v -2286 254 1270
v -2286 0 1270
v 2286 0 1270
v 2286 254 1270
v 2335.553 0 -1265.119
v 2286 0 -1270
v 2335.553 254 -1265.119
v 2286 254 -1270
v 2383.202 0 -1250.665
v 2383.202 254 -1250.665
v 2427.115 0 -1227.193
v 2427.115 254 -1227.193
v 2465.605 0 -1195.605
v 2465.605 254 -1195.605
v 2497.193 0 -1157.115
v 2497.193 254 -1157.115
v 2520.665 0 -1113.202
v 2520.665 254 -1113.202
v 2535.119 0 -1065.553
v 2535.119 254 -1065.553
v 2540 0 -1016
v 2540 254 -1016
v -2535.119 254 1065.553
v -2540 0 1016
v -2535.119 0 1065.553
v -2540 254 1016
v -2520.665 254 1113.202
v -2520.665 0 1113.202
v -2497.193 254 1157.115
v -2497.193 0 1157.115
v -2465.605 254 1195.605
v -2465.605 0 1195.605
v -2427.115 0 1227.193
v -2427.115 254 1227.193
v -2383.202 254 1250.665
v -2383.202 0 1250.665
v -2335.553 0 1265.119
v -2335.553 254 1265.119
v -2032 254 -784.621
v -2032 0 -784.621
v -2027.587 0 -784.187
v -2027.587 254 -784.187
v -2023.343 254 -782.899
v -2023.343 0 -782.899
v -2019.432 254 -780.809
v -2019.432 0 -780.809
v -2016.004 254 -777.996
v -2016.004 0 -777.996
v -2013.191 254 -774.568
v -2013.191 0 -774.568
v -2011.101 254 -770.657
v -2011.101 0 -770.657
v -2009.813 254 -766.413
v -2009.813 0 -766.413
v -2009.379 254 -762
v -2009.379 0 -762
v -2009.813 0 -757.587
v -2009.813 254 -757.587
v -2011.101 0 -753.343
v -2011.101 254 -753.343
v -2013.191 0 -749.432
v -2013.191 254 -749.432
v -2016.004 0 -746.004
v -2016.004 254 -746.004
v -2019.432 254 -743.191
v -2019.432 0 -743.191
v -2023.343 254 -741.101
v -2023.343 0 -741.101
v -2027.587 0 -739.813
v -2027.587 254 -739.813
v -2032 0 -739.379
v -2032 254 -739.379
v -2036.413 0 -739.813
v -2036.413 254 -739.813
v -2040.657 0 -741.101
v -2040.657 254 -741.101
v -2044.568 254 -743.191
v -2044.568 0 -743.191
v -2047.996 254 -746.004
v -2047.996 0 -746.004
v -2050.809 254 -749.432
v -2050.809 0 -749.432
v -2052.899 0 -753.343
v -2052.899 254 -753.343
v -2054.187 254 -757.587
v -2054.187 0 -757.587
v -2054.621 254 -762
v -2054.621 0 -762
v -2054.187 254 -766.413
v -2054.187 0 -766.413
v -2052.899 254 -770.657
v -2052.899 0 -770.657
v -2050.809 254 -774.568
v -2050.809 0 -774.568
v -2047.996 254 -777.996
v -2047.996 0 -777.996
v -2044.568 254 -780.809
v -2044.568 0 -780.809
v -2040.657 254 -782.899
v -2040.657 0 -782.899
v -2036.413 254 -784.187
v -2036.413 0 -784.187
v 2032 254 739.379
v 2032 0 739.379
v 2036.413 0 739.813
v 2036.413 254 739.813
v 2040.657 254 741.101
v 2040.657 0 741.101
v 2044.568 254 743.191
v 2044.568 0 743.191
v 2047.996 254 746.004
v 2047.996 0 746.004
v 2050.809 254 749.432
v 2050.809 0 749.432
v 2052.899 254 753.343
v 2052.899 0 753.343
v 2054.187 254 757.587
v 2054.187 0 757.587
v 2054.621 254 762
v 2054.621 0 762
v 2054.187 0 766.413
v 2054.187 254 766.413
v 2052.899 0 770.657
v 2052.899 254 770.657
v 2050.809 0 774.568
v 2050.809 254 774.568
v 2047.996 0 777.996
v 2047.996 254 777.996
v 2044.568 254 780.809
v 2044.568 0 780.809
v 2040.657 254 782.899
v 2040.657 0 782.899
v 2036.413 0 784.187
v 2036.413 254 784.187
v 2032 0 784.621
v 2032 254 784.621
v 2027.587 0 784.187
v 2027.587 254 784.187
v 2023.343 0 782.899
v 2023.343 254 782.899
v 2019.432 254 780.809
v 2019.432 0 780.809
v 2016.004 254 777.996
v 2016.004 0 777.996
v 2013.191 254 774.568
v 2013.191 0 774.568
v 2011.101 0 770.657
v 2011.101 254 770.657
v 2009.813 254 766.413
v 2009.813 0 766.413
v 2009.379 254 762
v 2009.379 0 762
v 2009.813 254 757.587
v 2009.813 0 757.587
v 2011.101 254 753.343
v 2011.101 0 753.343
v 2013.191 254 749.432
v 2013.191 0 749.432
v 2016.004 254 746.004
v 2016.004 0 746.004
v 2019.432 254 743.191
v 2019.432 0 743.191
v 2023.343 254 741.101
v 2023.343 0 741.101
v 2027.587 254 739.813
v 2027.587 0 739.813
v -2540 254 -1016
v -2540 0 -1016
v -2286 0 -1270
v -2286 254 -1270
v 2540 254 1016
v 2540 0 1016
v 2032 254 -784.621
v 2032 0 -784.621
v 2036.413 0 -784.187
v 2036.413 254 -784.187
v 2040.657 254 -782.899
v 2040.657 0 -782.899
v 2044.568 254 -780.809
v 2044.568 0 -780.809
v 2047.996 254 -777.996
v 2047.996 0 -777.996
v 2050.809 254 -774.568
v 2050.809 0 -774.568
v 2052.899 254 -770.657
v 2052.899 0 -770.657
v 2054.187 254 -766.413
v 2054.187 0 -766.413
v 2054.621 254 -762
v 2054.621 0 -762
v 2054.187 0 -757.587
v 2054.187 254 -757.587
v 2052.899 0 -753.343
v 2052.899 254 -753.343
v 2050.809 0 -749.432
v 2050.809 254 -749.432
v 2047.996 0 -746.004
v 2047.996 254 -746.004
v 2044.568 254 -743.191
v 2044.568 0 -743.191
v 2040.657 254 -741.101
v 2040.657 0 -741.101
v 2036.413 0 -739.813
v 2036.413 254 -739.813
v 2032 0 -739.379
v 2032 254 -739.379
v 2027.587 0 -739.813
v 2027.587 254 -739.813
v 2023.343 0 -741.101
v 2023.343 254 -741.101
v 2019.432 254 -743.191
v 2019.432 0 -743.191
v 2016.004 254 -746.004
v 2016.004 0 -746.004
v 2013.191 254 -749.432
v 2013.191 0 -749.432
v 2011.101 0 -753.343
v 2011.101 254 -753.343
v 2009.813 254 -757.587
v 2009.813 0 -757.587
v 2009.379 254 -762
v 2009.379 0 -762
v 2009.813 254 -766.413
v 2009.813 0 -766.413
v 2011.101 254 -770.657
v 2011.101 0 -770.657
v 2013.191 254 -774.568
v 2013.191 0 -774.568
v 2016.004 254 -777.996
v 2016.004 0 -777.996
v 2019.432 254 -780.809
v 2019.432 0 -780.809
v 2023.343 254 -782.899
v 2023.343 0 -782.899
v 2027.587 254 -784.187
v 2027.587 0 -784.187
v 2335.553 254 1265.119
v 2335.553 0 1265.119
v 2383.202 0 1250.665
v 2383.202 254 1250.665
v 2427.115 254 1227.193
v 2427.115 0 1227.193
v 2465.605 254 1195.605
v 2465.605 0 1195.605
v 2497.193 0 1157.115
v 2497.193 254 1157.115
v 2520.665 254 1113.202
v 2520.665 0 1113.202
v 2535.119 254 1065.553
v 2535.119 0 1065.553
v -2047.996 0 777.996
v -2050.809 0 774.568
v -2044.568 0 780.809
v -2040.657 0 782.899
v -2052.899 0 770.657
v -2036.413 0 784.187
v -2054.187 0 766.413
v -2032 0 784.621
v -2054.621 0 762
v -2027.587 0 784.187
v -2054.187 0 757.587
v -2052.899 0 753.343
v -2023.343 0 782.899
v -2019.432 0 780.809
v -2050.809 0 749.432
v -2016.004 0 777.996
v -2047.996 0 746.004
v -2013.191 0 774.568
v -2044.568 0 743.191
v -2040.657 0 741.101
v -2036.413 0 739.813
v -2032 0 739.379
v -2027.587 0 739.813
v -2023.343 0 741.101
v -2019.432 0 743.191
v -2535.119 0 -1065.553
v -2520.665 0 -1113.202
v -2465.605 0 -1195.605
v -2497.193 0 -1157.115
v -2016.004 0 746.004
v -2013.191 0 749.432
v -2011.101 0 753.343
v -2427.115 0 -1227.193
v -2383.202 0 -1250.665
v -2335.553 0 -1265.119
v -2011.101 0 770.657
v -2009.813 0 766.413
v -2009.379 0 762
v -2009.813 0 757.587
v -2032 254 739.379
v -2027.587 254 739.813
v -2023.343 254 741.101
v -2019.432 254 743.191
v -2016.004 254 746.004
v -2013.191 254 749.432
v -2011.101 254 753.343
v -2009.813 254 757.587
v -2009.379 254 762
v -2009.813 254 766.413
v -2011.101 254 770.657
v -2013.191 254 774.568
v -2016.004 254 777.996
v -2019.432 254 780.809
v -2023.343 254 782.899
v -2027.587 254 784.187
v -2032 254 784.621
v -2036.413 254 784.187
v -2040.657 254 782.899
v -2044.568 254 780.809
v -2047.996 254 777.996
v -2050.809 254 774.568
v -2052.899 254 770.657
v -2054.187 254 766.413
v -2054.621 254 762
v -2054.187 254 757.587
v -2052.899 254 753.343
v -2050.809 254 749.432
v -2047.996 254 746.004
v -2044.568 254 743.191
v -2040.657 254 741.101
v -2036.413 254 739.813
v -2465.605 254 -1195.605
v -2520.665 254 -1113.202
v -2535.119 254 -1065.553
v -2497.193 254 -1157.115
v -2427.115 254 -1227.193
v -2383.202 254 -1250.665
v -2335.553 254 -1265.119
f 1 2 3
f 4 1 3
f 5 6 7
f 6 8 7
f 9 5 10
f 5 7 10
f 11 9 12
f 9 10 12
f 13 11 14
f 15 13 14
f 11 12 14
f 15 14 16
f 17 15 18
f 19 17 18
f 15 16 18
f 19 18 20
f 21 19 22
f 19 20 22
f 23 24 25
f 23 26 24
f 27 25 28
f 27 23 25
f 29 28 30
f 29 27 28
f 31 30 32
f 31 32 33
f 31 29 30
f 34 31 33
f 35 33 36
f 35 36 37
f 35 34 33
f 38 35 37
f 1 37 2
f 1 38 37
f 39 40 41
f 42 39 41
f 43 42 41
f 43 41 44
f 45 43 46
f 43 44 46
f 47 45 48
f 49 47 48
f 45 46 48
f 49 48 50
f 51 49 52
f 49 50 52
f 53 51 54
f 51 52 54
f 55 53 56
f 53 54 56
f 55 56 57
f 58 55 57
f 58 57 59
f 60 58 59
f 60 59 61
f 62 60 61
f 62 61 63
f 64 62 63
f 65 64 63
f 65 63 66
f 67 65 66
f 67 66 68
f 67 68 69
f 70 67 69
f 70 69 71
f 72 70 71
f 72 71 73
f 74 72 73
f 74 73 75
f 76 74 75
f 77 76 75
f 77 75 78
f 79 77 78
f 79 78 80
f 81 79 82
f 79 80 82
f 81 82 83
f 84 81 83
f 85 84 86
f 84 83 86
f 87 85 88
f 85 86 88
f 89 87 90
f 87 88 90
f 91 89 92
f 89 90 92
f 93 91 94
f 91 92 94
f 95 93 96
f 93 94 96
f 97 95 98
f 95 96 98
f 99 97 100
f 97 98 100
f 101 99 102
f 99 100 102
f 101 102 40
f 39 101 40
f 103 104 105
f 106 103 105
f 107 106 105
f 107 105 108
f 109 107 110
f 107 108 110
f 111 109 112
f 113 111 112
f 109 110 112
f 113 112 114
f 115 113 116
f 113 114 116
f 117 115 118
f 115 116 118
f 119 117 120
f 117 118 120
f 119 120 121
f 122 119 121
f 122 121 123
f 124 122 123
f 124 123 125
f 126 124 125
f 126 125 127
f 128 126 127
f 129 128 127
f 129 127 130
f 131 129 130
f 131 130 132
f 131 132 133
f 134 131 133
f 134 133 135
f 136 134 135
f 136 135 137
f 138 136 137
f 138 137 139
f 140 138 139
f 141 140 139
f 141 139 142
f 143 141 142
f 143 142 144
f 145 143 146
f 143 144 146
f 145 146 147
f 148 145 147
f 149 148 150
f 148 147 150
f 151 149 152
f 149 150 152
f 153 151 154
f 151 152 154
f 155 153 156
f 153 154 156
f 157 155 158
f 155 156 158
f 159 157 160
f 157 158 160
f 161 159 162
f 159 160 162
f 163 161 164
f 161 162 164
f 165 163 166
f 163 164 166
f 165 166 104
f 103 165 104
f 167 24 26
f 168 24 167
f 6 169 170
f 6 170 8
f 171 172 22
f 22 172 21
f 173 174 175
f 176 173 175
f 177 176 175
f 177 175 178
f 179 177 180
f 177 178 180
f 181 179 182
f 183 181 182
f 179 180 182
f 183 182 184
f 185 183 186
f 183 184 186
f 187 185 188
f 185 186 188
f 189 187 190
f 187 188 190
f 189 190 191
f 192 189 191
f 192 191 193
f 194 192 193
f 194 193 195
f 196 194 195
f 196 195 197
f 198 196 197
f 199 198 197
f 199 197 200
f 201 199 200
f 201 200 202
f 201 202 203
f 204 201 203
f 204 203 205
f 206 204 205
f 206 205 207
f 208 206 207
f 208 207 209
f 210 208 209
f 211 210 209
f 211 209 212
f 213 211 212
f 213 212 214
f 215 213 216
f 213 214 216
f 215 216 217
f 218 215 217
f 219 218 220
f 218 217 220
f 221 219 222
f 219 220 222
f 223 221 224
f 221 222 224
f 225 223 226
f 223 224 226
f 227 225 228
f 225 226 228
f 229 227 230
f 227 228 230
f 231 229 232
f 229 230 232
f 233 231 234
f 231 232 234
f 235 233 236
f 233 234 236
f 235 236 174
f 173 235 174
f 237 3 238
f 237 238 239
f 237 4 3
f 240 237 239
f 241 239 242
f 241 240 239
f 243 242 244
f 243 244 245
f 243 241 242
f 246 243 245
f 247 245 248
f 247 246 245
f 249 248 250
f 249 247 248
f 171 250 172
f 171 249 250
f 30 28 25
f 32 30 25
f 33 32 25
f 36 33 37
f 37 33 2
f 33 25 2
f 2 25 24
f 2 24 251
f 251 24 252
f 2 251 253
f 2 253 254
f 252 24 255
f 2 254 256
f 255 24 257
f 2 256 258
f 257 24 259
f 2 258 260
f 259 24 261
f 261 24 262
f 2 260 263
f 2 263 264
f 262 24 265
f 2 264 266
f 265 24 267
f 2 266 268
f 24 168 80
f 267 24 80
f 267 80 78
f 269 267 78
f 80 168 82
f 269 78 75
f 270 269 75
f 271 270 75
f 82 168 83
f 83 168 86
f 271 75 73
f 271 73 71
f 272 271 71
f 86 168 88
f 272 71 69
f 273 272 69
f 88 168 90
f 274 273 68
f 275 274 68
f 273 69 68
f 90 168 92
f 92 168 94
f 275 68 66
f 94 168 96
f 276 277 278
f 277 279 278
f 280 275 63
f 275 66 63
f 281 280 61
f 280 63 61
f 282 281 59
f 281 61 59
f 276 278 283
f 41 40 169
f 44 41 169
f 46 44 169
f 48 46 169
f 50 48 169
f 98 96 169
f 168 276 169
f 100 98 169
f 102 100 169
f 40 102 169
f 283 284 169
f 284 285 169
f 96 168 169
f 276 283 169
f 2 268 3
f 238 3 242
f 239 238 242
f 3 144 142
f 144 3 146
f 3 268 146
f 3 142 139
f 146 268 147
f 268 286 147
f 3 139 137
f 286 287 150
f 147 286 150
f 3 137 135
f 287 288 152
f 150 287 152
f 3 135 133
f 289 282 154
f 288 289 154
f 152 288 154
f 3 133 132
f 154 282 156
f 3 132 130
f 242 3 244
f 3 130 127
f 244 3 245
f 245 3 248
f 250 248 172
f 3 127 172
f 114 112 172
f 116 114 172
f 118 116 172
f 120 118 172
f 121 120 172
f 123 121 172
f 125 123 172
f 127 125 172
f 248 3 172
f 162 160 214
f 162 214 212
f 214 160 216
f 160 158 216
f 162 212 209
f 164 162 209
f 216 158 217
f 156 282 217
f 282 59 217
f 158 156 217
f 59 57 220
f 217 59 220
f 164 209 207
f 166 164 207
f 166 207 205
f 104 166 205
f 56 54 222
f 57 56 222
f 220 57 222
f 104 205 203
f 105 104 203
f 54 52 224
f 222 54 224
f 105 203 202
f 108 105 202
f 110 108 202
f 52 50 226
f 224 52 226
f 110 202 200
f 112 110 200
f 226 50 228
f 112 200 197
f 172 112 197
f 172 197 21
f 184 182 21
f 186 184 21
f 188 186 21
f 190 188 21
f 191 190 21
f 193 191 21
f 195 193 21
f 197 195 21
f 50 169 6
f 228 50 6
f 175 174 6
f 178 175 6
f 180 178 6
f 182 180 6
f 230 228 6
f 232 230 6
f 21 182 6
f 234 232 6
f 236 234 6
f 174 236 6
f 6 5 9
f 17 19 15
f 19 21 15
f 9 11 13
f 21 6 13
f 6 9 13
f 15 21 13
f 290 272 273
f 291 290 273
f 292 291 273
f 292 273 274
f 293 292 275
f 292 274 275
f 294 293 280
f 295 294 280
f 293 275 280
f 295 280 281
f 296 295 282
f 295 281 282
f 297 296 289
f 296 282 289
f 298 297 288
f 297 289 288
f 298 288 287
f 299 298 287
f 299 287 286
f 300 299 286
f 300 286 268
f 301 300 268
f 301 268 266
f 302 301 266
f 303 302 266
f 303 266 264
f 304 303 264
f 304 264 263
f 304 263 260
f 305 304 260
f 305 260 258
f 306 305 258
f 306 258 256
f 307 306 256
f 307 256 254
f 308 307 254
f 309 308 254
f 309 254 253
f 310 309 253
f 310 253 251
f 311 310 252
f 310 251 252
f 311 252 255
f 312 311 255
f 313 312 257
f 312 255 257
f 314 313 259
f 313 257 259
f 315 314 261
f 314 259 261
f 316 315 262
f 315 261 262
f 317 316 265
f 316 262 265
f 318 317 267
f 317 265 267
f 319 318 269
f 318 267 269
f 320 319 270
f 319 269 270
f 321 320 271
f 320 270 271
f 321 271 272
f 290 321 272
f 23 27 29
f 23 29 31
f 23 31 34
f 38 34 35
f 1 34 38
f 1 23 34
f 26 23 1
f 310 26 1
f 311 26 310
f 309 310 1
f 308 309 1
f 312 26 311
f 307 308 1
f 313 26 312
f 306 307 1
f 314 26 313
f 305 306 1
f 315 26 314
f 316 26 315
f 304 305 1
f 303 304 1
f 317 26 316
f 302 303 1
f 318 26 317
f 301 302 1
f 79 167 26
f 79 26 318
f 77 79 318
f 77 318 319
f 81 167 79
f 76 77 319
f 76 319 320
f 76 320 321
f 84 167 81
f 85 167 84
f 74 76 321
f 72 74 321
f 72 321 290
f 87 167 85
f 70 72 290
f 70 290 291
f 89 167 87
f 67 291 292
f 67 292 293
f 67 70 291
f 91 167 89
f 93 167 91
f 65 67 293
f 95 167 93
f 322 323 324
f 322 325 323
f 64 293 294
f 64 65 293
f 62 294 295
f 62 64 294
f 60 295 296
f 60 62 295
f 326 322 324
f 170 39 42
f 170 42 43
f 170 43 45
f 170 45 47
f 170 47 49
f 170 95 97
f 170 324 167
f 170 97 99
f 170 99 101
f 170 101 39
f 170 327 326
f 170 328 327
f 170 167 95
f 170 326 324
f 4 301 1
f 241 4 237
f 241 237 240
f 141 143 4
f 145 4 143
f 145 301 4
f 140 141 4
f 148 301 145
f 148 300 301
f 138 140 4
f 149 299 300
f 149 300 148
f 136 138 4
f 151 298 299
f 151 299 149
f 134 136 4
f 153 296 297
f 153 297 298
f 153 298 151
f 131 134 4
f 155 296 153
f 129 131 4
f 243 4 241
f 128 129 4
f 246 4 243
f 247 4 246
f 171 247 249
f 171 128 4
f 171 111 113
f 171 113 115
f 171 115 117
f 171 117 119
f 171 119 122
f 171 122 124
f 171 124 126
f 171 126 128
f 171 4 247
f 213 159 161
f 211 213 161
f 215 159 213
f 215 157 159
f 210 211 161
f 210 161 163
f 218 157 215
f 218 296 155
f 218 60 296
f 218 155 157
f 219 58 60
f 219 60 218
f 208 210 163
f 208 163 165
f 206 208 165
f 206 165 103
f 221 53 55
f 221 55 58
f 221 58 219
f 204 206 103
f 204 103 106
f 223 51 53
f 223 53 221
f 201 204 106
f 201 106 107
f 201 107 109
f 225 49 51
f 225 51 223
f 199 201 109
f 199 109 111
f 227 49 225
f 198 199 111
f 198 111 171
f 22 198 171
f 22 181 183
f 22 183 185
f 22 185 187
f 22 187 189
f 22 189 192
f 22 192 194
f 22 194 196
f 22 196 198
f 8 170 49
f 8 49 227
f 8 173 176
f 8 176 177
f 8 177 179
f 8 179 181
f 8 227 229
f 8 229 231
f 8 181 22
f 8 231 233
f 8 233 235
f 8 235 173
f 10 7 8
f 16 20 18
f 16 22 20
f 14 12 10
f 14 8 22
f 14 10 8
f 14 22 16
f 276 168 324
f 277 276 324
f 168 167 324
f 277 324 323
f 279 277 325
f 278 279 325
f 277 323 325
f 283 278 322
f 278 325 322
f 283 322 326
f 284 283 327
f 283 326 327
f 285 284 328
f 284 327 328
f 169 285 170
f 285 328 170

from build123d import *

# Parameters (mm, degrees)
SKETCH1_W              = 5080
SKETCH1_H              = 2540
BOSS_EXTRUDE1_DEPTH    = 254
F_2_4_5_TAPPED_HOLE1_D = 45.24248
FILLET1_R              = 254


with BuildPart() as part:
    # Sketch1 → Boss-Extrude1 (new body)
    with BuildSketch(Plane(origin=(0, 0, 0), x_dir=(1, 0, 0), z_dir=(0, 1, 0))):
        Rectangle(SKETCH1_W, SKETCH1_H)
    extrude(amount=BOSS_EXTRUDE1_DEPTH)

    # 2-4.5 Tapped Hole1 (through all)
    with Locations(Plane(origin=(-2032, 254, 762), x_dir=(0, 0, 1), z_dir=(0, 1, 0))):
        with Locations((0, 0), (-1524, 0), (-1524, 4064), (0, 4064)):
            Hole(F_2_4_5_TAPPED_HOLE1_D / 2)

    # Fillet1
    fillet1_edges = [part.edges().sort_by_distance(p)[0] for p in [
        (2540, 127, 1270),
        (-2540, 127, 1270),
        (-2540, 127, -1270),
        (2540, 127, -1270),
    ]]
    fillet(fillet1_edges, radius=FILLET1_R)


solid = part.part
